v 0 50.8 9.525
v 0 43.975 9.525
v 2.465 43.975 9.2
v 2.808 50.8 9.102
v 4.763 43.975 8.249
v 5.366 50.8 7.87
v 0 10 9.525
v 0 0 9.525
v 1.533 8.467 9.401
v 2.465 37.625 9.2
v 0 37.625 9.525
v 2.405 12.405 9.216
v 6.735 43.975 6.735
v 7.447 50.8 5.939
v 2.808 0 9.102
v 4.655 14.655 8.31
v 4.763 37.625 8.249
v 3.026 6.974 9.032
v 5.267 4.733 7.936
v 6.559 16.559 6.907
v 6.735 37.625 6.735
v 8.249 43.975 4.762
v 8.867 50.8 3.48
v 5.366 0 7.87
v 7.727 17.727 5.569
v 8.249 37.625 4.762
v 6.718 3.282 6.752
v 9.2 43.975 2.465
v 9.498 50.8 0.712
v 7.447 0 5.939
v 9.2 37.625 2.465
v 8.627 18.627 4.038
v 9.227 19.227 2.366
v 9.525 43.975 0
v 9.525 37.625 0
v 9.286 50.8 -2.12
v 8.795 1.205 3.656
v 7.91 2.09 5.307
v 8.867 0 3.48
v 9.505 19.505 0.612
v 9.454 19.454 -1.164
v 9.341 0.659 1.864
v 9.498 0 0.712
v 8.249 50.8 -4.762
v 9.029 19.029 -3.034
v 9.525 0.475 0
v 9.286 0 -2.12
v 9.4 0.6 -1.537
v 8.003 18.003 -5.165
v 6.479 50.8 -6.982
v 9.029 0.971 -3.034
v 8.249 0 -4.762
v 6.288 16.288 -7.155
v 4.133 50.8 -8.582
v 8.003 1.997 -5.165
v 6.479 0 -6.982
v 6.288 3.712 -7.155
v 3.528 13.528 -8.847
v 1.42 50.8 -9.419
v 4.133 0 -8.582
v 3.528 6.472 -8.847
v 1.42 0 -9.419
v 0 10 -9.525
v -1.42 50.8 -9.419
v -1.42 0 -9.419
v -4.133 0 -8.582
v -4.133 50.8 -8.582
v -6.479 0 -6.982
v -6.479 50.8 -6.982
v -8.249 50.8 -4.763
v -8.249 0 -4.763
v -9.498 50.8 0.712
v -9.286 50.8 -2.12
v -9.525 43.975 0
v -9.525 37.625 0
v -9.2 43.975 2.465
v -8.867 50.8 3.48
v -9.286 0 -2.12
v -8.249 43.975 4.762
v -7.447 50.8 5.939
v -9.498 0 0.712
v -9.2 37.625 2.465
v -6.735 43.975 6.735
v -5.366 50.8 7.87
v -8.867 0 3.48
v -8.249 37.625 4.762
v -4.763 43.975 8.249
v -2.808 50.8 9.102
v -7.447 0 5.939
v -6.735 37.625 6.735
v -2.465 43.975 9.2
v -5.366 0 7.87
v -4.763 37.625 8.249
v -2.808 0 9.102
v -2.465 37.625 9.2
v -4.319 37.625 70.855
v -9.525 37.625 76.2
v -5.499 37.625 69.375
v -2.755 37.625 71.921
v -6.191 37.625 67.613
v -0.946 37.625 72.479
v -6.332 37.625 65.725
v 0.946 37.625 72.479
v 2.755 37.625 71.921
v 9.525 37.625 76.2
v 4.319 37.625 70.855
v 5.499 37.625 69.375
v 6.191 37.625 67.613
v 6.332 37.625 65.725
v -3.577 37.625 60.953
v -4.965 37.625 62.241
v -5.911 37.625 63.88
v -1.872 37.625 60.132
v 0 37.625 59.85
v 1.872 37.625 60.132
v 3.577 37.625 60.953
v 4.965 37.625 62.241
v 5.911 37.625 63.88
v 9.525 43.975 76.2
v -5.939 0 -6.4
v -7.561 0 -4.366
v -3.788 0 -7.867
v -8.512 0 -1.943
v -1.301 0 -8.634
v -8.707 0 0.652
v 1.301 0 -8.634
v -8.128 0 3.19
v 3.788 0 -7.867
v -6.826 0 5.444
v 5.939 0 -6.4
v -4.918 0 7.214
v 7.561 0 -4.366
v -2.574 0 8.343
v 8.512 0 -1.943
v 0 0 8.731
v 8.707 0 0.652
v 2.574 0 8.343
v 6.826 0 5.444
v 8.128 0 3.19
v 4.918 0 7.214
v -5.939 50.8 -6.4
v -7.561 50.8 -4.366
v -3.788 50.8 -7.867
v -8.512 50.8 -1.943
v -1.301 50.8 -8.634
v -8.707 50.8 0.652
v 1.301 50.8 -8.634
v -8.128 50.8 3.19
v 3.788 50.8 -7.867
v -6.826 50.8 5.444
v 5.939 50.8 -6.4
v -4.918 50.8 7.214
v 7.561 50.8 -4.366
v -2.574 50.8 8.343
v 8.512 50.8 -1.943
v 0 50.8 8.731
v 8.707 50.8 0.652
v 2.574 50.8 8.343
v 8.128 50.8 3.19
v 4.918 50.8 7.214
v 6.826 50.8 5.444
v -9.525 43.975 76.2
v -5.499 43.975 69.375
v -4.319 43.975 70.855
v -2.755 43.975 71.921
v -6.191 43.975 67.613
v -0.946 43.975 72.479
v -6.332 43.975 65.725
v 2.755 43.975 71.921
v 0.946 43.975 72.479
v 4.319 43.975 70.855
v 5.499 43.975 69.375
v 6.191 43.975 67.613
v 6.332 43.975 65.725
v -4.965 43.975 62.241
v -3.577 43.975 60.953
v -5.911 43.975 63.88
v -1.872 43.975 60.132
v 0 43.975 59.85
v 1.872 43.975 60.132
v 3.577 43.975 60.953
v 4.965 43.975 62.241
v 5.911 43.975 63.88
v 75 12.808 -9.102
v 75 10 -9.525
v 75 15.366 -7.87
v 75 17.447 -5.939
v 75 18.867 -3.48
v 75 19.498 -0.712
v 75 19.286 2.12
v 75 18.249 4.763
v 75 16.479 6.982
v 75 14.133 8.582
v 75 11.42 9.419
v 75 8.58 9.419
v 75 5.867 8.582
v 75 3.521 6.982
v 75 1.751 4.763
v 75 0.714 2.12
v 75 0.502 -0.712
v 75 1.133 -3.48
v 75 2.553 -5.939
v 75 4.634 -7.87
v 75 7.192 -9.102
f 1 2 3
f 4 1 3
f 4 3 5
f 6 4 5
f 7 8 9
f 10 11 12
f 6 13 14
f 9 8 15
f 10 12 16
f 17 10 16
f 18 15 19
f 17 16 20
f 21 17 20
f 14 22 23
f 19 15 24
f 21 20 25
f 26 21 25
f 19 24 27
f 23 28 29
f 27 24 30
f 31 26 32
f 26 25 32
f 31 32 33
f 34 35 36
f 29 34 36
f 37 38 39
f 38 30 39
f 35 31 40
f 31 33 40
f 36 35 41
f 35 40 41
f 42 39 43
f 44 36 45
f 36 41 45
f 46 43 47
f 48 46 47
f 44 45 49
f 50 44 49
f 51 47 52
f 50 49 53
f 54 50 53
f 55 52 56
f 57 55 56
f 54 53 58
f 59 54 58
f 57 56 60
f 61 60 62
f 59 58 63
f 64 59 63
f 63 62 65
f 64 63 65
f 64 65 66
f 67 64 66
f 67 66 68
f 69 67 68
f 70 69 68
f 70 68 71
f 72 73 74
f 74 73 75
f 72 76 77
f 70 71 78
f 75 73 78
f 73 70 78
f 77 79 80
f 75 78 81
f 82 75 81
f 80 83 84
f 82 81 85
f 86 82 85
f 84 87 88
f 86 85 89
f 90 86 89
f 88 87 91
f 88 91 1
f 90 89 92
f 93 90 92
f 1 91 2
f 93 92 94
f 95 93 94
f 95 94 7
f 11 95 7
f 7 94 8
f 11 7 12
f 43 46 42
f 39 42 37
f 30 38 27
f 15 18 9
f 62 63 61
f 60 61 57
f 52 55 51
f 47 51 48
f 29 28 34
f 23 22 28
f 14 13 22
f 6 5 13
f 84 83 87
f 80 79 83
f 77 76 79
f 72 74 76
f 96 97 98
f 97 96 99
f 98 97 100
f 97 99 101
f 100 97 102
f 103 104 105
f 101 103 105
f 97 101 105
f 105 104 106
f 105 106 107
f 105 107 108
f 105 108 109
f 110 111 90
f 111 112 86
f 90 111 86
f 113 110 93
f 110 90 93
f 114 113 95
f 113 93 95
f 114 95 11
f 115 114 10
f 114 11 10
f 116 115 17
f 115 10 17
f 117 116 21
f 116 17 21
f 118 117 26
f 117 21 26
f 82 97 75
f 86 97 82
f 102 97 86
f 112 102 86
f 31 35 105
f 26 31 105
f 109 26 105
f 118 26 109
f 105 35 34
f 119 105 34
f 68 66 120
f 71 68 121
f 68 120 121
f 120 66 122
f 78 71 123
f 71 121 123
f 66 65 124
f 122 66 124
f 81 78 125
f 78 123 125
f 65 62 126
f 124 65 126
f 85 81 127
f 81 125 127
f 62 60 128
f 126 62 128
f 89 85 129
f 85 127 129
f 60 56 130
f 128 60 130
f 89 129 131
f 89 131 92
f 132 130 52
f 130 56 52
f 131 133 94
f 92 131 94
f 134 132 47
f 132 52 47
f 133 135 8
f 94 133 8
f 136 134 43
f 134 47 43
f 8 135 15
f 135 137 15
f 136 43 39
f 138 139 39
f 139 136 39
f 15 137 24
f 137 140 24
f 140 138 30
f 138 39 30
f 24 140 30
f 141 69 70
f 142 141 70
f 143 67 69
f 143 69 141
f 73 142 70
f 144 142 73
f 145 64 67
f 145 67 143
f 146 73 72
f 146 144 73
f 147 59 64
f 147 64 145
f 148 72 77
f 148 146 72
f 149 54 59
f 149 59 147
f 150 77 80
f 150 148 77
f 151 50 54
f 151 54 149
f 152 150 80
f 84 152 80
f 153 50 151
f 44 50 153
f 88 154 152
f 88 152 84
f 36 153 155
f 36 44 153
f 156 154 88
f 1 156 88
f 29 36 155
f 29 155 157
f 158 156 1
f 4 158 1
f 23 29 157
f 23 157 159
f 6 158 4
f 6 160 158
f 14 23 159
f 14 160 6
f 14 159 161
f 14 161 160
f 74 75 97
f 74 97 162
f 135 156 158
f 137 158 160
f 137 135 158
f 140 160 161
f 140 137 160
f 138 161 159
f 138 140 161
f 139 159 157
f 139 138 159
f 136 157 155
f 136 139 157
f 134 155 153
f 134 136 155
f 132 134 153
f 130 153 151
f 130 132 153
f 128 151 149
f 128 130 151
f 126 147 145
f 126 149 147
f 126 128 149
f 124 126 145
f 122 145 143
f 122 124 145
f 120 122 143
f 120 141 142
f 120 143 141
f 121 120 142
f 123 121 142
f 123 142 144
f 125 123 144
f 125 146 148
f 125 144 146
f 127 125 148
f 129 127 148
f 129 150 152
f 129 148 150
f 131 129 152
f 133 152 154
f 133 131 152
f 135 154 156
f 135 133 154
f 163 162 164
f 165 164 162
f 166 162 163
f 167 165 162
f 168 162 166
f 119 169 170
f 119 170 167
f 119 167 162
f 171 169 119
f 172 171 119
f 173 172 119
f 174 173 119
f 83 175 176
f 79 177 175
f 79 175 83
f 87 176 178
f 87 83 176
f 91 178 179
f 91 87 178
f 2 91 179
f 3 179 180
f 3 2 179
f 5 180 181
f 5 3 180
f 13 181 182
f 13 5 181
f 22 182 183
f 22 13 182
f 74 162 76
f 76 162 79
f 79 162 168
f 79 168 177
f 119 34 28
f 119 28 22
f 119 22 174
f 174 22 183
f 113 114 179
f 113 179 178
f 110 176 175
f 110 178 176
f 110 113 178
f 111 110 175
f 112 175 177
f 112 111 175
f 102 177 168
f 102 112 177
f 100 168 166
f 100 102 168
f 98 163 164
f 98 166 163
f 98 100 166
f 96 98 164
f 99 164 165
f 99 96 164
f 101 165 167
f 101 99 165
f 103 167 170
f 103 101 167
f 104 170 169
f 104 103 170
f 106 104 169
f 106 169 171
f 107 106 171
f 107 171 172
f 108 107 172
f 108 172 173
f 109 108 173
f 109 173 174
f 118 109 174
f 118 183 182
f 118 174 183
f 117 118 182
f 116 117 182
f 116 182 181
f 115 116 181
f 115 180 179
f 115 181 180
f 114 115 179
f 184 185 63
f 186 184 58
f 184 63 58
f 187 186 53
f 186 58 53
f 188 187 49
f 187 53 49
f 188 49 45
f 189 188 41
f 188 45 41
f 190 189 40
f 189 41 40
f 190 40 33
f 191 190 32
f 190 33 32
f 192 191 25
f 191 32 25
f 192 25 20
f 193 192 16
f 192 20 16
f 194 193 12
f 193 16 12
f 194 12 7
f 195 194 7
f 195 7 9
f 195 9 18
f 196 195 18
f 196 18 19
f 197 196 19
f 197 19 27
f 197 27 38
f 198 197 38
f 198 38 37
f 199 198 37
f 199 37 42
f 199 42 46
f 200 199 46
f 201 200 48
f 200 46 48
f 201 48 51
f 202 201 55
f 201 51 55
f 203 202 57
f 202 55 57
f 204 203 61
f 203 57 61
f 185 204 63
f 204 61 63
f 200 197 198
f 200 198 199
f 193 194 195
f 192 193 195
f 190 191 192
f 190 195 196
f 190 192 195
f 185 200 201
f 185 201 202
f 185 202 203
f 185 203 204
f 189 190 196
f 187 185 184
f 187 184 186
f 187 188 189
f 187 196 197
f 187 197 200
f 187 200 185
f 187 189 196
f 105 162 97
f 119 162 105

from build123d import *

# Parameters (mm, degrees)
SKETCH1_R          = 9.525
SLEEVE_DEPTH       = 50.8
SKETCH2_W          = 19.05
SKETCH2_H          = 6.35
BRACKET_DEPTH      = 76.2
SKETCH4_R          = 6.35
BRACKET_HOLE_DEPTH = 93.075
SKETCH5_R          = 9.525
SHAFT_DEPTH        = 75
SKETCH6_R          = 8.73125
SLEEVE_HOLE_DEPTH  = 119.372631972


with BuildPart() as part:
    # Sketch1 → Sleeve (new body)
    with BuildSketch(Plane(origin=(0, 0, 0), x_dir=(1, 0, 0), z_dir=(0, 1, 0))):
        with Locations(Location((0, 0, 0), (0, 0, 270))):
            Circle(SKETCH1_R)
    extrude(amount=SLEEVE_DEPTH)

    # Sketch2 → Bracket (add)
    with BuildSketch(Plane.XY):
        with Locations((0, 40.8)):
            Rectangle(SKETCH2_W, SKETCH2_H)
    extrude(amount=BRACKET_DEPTH)

    # Sketch4 → Bracket Hole (cut, through all)
    with BuildSketch(Plane(origin=(0, 0, 0), x_dir=(1, 0, 0), z_dir=(0, 1, 0))):
        with Locations(Location((0, -66.2, 0), (0, 0, 90))):
            Circle(SKETCH4_R)
    extrude(amount=BRACKET_HOLE_DEPTH, mode=Mode.SUBTRACT)

    # Sketch5 → Shaft (add)
    with BuildSketch(Plane(origin=(0, 0, 0), x_dir=(0, 0, -1), z_dir=(1, 0, 0))):
        with Locations((0, 10)):
            Circle(SKETCH5_R)
    extrude(amount=SHAFT_DEPTH)

    # Sketch6 → Sleeve Hole (cut, through all)
    with BuildSketch(Plane(origin=(0, 0, 0), x_dir=(1, 0, 0), z_dir=(0, 1, 0))):
        with Locations(Location((0, 0, 0), (0, 0, 270))):
            Circle(SKETCH6_R)
    extrude(amount=SLEEVE_HOLE_DEPTH, mode=Mode.SUBTRACT)


solid = part.part
